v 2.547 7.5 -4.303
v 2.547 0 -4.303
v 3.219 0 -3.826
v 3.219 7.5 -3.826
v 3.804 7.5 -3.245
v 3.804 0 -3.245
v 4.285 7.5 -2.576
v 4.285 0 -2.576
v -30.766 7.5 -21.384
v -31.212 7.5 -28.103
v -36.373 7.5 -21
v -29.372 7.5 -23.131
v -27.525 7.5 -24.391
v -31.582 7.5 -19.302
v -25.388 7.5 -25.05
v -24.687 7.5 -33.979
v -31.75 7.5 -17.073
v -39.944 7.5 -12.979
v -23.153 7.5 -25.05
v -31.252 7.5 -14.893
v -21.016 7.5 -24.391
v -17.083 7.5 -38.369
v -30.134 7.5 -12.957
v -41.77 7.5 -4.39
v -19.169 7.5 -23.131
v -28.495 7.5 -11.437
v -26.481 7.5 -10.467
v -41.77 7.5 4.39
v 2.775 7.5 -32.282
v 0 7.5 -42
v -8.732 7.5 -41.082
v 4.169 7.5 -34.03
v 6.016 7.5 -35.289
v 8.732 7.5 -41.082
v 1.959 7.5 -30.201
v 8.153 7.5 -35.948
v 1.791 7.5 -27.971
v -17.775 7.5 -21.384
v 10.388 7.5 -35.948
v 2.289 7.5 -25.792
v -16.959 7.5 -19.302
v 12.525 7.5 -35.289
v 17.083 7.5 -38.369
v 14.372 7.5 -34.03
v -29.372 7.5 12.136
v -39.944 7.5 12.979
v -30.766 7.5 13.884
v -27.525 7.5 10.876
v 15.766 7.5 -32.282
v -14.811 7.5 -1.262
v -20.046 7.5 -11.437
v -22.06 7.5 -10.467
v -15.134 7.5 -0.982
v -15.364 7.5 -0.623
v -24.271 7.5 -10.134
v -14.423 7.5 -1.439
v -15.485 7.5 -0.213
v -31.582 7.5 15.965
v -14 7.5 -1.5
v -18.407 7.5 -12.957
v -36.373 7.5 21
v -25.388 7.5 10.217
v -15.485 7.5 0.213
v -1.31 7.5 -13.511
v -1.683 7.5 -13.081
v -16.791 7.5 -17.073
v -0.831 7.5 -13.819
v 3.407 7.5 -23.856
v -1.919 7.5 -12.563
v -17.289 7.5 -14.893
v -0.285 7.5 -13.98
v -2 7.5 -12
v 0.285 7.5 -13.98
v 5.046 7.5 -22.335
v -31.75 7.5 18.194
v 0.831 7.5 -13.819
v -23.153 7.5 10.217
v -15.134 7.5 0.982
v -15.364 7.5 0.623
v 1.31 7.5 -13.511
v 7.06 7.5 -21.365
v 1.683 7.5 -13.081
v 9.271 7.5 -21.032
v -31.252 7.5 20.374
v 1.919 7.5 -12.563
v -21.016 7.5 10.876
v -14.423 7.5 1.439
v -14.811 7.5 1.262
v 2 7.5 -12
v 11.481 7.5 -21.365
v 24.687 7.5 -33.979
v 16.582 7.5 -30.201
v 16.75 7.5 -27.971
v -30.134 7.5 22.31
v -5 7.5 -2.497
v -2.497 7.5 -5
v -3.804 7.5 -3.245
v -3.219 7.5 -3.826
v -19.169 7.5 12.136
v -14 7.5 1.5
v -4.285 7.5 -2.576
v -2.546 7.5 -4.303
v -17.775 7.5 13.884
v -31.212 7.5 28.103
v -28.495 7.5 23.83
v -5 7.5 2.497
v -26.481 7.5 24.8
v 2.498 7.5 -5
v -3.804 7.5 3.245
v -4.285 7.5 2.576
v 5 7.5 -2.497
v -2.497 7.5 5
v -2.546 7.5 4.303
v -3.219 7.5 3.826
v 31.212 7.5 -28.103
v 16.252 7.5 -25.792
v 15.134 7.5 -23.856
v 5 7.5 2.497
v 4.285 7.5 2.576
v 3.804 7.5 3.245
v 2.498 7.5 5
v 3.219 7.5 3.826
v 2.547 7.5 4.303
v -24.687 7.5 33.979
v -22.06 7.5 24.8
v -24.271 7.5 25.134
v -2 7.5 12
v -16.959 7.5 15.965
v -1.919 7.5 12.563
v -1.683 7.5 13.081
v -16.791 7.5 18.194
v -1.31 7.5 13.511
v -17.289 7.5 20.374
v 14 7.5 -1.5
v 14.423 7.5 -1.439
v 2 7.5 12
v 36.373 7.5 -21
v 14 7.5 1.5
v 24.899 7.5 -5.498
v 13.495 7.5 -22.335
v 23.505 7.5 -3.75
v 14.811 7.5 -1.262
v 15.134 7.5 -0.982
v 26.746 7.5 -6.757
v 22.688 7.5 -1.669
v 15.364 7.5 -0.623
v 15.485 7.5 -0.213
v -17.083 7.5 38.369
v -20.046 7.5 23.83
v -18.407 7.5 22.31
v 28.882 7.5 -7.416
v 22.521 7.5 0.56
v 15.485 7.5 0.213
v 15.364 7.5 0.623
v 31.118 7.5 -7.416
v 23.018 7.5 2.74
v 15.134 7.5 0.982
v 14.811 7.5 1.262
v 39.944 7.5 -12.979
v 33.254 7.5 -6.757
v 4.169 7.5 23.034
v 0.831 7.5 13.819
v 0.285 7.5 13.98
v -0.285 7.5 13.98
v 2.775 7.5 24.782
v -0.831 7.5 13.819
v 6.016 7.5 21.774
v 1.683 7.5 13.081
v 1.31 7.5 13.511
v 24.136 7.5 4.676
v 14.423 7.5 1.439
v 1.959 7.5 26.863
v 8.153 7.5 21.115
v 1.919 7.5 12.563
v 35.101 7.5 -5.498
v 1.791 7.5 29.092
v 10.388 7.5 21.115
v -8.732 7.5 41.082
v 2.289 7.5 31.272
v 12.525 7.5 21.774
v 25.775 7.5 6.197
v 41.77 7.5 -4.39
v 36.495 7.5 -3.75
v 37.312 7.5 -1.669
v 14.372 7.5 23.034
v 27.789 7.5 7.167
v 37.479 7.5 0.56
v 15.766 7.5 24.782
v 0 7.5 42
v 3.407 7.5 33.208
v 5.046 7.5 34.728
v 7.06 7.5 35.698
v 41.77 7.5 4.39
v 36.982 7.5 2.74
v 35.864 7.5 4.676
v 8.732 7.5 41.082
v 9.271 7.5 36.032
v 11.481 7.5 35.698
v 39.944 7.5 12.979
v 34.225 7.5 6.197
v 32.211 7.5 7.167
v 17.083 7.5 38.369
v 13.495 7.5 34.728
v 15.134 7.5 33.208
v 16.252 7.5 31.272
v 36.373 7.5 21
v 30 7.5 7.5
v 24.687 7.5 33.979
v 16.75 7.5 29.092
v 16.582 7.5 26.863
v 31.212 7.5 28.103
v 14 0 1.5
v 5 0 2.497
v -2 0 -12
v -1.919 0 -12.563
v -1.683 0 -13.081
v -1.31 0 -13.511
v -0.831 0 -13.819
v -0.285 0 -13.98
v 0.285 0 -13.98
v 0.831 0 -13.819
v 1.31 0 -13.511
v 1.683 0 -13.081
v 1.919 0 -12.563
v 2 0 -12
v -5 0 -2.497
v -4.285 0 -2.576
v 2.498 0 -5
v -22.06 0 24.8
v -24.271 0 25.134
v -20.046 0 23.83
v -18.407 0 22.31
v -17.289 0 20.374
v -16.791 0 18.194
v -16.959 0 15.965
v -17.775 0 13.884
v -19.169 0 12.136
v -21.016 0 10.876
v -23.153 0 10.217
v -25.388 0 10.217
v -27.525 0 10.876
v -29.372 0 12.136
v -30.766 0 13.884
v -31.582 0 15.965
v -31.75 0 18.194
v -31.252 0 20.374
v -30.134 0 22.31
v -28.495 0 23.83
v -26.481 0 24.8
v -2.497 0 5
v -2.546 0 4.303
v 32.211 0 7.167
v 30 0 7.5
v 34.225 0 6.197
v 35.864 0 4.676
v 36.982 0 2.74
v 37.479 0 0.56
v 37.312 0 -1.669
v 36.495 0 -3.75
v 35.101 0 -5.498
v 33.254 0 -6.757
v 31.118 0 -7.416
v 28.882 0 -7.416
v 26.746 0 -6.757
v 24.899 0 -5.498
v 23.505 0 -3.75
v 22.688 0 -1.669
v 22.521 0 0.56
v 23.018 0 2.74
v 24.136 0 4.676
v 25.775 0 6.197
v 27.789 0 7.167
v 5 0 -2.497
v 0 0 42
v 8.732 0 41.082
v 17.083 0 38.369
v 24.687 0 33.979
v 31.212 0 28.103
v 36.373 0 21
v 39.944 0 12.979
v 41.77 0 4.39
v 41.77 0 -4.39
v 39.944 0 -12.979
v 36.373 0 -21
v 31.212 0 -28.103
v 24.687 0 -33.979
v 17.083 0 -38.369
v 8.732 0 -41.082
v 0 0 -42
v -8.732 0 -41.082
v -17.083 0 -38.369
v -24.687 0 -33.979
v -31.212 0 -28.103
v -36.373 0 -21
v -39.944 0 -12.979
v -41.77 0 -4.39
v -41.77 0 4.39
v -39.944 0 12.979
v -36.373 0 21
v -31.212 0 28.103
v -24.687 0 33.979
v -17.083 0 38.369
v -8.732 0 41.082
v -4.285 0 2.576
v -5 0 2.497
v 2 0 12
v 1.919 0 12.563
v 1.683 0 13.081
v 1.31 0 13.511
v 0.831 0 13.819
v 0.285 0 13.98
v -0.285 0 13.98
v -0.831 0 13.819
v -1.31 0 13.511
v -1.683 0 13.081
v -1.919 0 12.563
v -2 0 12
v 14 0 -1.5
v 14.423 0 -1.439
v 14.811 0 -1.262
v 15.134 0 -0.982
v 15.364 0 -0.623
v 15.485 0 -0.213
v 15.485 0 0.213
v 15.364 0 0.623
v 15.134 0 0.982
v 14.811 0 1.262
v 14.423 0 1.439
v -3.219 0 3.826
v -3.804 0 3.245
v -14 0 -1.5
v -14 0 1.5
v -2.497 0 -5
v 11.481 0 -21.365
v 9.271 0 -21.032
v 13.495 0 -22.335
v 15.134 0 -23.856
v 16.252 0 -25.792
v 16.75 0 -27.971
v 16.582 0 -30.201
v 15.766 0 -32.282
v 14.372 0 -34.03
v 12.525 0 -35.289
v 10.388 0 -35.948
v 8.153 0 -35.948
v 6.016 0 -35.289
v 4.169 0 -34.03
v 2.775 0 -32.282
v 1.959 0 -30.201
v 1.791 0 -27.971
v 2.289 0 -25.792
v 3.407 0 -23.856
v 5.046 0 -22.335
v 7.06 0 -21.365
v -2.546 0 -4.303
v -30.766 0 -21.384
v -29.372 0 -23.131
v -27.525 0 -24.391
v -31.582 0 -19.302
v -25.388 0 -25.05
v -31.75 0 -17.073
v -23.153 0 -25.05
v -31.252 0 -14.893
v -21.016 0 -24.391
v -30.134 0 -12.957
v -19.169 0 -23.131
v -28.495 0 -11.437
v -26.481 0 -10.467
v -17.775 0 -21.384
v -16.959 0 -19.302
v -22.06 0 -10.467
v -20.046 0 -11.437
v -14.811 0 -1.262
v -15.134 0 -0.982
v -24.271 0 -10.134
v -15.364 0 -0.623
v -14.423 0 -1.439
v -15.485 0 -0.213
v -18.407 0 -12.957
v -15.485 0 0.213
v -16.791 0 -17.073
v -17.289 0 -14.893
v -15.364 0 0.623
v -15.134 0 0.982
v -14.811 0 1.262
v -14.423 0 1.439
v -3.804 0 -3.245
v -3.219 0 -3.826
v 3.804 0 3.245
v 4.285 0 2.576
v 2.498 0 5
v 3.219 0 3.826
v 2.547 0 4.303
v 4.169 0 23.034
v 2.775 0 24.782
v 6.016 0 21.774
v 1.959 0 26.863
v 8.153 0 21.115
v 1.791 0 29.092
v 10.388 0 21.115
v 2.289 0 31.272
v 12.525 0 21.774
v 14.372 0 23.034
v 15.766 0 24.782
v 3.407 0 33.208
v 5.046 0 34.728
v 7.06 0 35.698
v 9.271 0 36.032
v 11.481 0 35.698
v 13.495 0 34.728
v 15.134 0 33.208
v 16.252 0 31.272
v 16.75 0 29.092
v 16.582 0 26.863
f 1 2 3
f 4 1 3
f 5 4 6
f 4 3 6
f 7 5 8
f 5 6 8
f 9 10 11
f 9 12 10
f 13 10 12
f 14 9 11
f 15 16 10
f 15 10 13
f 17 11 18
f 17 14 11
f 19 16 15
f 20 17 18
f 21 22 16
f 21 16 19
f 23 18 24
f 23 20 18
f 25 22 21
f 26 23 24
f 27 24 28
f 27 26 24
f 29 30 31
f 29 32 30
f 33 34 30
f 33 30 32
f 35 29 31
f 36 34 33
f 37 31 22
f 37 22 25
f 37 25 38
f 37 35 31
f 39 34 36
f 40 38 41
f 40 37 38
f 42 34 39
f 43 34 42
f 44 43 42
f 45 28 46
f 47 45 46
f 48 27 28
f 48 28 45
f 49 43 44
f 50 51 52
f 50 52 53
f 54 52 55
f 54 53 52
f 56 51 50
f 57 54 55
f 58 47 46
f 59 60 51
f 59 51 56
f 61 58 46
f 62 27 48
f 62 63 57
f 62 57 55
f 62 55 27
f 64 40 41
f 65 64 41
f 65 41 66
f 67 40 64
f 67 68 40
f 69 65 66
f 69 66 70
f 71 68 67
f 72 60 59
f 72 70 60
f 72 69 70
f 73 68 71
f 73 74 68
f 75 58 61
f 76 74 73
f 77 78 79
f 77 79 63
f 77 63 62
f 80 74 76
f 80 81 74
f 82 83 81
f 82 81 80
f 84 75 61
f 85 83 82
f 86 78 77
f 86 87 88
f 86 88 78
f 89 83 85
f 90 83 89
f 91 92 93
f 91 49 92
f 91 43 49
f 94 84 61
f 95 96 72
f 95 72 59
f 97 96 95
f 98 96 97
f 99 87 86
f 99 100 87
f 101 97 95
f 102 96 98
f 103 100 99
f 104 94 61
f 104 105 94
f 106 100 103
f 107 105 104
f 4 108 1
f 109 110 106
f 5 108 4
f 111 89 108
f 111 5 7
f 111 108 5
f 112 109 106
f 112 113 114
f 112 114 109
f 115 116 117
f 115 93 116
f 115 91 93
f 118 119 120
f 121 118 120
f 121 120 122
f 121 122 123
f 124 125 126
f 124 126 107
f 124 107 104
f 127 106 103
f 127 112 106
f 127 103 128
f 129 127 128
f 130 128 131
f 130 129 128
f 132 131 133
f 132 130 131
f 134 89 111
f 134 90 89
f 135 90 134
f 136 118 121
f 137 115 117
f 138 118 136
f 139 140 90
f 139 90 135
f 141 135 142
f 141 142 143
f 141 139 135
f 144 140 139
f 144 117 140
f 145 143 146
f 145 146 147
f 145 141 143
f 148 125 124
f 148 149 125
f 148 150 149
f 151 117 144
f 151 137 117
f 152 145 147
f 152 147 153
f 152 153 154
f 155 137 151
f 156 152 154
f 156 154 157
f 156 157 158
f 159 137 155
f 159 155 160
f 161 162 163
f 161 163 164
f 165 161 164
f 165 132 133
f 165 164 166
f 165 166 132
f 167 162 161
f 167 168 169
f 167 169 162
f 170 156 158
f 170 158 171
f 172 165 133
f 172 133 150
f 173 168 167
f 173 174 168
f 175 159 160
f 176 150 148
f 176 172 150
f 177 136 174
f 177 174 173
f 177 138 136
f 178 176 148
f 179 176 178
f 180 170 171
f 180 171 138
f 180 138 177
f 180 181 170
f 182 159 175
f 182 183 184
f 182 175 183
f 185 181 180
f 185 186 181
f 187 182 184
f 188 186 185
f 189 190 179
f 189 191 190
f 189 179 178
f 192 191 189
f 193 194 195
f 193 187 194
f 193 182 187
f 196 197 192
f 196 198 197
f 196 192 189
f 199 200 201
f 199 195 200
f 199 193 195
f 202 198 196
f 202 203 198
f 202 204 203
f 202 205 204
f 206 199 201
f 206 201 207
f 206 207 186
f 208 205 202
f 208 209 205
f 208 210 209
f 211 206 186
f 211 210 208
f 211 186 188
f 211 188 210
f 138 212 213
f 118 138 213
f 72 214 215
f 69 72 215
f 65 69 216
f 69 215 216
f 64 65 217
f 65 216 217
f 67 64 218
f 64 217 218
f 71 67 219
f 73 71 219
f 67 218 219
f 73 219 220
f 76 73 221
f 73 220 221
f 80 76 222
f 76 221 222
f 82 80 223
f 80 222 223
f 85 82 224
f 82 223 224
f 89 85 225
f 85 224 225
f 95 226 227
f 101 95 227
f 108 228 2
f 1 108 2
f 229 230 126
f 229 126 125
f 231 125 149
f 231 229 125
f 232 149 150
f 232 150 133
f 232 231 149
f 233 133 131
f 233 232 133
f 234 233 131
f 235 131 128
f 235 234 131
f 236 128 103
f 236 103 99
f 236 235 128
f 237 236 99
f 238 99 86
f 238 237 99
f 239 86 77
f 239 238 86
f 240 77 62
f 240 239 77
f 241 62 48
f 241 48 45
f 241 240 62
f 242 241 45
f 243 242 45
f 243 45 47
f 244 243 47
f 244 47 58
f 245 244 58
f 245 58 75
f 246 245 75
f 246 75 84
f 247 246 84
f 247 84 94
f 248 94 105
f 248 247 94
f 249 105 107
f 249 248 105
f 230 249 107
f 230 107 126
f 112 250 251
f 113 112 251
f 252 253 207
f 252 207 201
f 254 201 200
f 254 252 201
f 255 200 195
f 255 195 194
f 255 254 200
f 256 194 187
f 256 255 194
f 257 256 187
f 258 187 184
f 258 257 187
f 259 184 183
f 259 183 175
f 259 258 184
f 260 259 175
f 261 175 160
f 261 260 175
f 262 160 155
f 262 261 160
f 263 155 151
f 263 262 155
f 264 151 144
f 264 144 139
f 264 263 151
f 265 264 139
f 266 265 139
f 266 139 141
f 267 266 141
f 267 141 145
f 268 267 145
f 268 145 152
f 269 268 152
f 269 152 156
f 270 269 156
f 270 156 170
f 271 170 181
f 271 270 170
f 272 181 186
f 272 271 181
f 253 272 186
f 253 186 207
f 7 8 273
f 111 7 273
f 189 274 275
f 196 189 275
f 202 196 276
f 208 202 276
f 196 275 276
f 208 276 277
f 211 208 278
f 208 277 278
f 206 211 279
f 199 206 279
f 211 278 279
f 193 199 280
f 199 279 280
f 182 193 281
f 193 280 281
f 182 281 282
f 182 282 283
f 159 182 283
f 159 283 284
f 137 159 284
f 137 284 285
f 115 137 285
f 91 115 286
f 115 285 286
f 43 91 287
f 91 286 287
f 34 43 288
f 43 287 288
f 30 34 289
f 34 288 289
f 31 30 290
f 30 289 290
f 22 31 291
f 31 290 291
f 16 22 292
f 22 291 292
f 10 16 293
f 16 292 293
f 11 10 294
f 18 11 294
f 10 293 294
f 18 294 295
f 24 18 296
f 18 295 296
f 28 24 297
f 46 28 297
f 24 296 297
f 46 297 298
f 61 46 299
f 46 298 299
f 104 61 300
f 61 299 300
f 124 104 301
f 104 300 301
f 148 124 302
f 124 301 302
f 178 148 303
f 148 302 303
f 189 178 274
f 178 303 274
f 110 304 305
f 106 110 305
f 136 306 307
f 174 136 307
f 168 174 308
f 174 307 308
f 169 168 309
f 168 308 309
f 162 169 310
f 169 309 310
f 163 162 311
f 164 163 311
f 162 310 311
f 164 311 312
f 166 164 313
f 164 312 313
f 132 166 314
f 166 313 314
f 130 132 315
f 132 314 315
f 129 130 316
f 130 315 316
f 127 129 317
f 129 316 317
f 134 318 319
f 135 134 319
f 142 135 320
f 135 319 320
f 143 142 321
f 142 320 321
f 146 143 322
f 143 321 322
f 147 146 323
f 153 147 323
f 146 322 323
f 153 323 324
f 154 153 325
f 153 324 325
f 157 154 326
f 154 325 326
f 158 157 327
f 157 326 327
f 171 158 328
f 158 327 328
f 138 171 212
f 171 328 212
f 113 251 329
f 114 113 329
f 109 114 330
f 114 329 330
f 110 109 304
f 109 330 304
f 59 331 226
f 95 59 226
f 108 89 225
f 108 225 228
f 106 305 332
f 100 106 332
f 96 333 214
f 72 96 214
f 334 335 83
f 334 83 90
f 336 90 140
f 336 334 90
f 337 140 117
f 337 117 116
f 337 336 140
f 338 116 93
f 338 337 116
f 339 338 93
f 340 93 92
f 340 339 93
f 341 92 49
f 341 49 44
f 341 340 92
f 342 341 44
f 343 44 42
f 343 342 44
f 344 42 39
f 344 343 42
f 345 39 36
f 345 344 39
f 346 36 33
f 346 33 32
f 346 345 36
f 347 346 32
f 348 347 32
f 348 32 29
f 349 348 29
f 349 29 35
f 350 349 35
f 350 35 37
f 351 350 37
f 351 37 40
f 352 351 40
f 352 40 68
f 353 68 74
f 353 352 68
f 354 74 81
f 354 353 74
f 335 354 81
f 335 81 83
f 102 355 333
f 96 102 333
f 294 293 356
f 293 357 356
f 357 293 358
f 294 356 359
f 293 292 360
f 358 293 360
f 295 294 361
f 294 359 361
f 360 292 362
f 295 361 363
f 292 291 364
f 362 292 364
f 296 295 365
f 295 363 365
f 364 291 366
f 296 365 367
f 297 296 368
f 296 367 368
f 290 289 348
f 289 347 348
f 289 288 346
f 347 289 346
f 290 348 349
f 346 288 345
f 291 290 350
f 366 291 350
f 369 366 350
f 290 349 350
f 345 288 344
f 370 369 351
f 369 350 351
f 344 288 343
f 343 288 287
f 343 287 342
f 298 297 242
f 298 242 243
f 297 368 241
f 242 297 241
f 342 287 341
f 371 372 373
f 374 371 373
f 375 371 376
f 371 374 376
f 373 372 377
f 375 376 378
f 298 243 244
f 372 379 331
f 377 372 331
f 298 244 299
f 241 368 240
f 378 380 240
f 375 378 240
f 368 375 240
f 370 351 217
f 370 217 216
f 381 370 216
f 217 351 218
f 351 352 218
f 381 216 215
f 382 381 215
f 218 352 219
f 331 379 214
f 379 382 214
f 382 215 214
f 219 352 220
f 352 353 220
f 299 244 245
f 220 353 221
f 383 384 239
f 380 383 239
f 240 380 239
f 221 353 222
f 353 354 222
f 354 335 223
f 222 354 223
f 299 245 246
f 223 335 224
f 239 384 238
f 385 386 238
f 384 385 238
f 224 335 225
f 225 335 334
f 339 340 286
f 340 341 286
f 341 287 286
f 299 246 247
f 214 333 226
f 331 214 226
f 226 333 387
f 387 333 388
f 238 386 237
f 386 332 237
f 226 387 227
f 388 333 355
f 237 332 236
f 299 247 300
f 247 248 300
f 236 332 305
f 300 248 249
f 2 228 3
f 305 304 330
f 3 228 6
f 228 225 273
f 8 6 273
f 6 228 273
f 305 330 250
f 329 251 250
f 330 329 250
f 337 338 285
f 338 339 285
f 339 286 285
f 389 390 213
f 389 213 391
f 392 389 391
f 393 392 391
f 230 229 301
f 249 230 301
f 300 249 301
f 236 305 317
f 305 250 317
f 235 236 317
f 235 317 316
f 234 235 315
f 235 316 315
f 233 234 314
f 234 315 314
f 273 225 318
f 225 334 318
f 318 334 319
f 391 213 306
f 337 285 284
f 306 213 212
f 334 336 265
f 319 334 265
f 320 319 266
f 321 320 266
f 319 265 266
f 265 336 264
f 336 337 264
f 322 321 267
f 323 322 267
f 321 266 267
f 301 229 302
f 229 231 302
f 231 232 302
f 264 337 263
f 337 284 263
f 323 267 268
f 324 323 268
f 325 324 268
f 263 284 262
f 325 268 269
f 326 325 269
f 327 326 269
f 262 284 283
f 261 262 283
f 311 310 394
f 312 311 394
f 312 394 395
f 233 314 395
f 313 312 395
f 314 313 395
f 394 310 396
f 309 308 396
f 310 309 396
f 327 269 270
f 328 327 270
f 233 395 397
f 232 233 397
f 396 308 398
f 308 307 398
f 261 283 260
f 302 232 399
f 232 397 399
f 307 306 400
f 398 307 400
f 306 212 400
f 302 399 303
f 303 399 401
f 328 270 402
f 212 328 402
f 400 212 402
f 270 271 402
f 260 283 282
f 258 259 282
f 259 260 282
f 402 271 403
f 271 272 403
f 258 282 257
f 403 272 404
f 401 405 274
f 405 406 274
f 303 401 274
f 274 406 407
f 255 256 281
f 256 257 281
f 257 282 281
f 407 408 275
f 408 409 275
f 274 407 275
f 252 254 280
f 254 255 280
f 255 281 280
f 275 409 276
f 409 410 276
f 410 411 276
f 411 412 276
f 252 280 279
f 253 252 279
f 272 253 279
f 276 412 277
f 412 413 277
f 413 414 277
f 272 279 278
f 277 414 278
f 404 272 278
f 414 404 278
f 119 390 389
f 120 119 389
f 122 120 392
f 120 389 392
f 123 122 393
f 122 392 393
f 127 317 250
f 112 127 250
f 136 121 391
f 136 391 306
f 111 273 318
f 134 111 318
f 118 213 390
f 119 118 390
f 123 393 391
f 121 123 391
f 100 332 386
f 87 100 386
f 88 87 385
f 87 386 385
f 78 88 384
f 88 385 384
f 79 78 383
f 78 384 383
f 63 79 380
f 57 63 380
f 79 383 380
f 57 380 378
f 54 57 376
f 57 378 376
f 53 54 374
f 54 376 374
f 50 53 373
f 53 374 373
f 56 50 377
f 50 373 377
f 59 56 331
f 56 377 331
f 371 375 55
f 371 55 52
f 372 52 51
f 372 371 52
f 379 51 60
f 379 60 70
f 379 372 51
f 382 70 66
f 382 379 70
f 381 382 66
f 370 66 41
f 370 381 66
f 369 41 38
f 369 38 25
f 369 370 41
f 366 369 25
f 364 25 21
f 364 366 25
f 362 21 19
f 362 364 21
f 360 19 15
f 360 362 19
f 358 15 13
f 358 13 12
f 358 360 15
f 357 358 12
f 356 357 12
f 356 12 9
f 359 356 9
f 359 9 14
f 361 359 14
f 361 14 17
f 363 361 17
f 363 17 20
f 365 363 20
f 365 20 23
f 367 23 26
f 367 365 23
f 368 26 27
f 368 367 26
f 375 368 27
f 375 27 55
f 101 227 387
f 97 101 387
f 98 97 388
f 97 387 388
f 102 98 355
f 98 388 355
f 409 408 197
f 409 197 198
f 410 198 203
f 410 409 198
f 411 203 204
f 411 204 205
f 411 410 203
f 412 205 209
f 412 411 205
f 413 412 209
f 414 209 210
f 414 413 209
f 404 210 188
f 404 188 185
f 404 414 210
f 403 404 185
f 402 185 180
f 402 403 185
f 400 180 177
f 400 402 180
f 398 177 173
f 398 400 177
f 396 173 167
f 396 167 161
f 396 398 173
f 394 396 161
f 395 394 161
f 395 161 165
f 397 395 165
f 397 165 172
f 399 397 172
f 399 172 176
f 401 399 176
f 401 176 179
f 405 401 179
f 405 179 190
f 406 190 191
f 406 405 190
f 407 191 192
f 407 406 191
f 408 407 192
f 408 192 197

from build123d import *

# Parameters (mm, degrees)
SKETCH1_R           = 42
SKETCH1_R_2         = 7.5
BOSS_EXTRUDE2_DEPTH = 7.5


with BuildPart() as part:
    # Sketch1 → Boss-Extrude2 (new body)
    with BuildSketch(Plane(origin=(0, 0, 0), x_dir=(1, 0, 0), z_dir=(0, 1, 0))):
        with Locations(Location((0, 0, 0), (0, 0, 270))):
            Circle(SKETCH1_R)
        with Locations(Location((30, 0, 0), (0, 0, 270))):
            Circle(SKETCH1_R_2, mode=Mode.SUBTRACT)
        with Locations(Location((9.270509831, -28.531695489, 0), (0, 0, 270))):
            Circle(SKETCH1_R_2, mode=Mode.SUBTRACT)
        with Locations(Location((-24.270509831, -17.633557569, 0), (0, 0, 270))):
            Circle(SKETCH1_R_2, mode=Mode.SUBTRACT)
        with Locations(Location((-24.270509831, 17.633557569, 0), (0, 0, 270))):
            Circle(SKETCH1_R_2, mode=Mode.SUBTRACT)
        with Locations(Location((9.270509831, 28.531695489, 0), (0, 0, 270))):
            Circle(SKETCH1_R_2, mode=Mode.SUBTRACT)
        with BuildLine():
            Line((4.999698513, -2.497254635), (4.285172416, -2.575710114))
            ThreePointArc((4.285172416, -2.575710114), (3.523319938, -3.547280908), (2.546607961, -4.302531013))
            Line((2.546607961, -4.302531013), (2.497527986, -4.99999802))
            Line((2.497527986, -4.99999802), (2, -12))
            ThreePointArc((2, -12), (0, -14), (-2, -12))
            Line((-2, -12), (-2.496981283, -4.99999802))
            Line((-2.496981283, -4.99999802), (-2.546494806, -4.302597986))
            ThreePointArc((-2.546494806, -4.302597986), (-3.523273292, -3.547327238), (-4.285172416, -2.575710114))
            Line((-4.285172416, -2.575710114), (-4.999698513, -2.497254635))
            Line((-4.999698513, -2.497254635), (-14, -1.5))
            ThreePointArc((-14, -1.5), (-15.5, 0), (-14, 1.5))
            Line((-14, 1.5), (-4.999698513, 2.497254635))
            Line((-4.999698513, 2.497254635), (-4.285172416, 2.575710114))
            ThreePointArc((-4.285172416, 2.575710114), (-3.523273292, 3.547327238), (-2.546494806, 4.302597986))
            Line((-2.546494806, 4.302597986), (-2.496981283, 4.99999802))
            Line((-2.496981283, 4.99999802), (-2, 12))
            ThreePointArc((-2, 12), (0, 14), (2, 12))
            Line((2, 12), (2.497527986, 4.99999802))
            Line((2.497527986, 4.99999802), (2.546607961, 4.302531013))
            ThreePointArc((2.546607961, 4.302531013), (3.523319938, 3.547280908), (4.285172416, 2.575710114))
            Line((4.285172416, 2.575710114), (4.999698513, 2.497254635))
            Line((4.999698513, 2.497254635), (14, 1.5))
            ThreePointArc((14, 1.5), (15.5, 0), (14, -1.5))
            Line((14, -1.5), (4.999698513, -2.497254635))
        make_face(mode=Mode.SUBTRACT)
    extrude(amount=BOSS_EXTRUDE2_DEPTH)


solid = part.part
